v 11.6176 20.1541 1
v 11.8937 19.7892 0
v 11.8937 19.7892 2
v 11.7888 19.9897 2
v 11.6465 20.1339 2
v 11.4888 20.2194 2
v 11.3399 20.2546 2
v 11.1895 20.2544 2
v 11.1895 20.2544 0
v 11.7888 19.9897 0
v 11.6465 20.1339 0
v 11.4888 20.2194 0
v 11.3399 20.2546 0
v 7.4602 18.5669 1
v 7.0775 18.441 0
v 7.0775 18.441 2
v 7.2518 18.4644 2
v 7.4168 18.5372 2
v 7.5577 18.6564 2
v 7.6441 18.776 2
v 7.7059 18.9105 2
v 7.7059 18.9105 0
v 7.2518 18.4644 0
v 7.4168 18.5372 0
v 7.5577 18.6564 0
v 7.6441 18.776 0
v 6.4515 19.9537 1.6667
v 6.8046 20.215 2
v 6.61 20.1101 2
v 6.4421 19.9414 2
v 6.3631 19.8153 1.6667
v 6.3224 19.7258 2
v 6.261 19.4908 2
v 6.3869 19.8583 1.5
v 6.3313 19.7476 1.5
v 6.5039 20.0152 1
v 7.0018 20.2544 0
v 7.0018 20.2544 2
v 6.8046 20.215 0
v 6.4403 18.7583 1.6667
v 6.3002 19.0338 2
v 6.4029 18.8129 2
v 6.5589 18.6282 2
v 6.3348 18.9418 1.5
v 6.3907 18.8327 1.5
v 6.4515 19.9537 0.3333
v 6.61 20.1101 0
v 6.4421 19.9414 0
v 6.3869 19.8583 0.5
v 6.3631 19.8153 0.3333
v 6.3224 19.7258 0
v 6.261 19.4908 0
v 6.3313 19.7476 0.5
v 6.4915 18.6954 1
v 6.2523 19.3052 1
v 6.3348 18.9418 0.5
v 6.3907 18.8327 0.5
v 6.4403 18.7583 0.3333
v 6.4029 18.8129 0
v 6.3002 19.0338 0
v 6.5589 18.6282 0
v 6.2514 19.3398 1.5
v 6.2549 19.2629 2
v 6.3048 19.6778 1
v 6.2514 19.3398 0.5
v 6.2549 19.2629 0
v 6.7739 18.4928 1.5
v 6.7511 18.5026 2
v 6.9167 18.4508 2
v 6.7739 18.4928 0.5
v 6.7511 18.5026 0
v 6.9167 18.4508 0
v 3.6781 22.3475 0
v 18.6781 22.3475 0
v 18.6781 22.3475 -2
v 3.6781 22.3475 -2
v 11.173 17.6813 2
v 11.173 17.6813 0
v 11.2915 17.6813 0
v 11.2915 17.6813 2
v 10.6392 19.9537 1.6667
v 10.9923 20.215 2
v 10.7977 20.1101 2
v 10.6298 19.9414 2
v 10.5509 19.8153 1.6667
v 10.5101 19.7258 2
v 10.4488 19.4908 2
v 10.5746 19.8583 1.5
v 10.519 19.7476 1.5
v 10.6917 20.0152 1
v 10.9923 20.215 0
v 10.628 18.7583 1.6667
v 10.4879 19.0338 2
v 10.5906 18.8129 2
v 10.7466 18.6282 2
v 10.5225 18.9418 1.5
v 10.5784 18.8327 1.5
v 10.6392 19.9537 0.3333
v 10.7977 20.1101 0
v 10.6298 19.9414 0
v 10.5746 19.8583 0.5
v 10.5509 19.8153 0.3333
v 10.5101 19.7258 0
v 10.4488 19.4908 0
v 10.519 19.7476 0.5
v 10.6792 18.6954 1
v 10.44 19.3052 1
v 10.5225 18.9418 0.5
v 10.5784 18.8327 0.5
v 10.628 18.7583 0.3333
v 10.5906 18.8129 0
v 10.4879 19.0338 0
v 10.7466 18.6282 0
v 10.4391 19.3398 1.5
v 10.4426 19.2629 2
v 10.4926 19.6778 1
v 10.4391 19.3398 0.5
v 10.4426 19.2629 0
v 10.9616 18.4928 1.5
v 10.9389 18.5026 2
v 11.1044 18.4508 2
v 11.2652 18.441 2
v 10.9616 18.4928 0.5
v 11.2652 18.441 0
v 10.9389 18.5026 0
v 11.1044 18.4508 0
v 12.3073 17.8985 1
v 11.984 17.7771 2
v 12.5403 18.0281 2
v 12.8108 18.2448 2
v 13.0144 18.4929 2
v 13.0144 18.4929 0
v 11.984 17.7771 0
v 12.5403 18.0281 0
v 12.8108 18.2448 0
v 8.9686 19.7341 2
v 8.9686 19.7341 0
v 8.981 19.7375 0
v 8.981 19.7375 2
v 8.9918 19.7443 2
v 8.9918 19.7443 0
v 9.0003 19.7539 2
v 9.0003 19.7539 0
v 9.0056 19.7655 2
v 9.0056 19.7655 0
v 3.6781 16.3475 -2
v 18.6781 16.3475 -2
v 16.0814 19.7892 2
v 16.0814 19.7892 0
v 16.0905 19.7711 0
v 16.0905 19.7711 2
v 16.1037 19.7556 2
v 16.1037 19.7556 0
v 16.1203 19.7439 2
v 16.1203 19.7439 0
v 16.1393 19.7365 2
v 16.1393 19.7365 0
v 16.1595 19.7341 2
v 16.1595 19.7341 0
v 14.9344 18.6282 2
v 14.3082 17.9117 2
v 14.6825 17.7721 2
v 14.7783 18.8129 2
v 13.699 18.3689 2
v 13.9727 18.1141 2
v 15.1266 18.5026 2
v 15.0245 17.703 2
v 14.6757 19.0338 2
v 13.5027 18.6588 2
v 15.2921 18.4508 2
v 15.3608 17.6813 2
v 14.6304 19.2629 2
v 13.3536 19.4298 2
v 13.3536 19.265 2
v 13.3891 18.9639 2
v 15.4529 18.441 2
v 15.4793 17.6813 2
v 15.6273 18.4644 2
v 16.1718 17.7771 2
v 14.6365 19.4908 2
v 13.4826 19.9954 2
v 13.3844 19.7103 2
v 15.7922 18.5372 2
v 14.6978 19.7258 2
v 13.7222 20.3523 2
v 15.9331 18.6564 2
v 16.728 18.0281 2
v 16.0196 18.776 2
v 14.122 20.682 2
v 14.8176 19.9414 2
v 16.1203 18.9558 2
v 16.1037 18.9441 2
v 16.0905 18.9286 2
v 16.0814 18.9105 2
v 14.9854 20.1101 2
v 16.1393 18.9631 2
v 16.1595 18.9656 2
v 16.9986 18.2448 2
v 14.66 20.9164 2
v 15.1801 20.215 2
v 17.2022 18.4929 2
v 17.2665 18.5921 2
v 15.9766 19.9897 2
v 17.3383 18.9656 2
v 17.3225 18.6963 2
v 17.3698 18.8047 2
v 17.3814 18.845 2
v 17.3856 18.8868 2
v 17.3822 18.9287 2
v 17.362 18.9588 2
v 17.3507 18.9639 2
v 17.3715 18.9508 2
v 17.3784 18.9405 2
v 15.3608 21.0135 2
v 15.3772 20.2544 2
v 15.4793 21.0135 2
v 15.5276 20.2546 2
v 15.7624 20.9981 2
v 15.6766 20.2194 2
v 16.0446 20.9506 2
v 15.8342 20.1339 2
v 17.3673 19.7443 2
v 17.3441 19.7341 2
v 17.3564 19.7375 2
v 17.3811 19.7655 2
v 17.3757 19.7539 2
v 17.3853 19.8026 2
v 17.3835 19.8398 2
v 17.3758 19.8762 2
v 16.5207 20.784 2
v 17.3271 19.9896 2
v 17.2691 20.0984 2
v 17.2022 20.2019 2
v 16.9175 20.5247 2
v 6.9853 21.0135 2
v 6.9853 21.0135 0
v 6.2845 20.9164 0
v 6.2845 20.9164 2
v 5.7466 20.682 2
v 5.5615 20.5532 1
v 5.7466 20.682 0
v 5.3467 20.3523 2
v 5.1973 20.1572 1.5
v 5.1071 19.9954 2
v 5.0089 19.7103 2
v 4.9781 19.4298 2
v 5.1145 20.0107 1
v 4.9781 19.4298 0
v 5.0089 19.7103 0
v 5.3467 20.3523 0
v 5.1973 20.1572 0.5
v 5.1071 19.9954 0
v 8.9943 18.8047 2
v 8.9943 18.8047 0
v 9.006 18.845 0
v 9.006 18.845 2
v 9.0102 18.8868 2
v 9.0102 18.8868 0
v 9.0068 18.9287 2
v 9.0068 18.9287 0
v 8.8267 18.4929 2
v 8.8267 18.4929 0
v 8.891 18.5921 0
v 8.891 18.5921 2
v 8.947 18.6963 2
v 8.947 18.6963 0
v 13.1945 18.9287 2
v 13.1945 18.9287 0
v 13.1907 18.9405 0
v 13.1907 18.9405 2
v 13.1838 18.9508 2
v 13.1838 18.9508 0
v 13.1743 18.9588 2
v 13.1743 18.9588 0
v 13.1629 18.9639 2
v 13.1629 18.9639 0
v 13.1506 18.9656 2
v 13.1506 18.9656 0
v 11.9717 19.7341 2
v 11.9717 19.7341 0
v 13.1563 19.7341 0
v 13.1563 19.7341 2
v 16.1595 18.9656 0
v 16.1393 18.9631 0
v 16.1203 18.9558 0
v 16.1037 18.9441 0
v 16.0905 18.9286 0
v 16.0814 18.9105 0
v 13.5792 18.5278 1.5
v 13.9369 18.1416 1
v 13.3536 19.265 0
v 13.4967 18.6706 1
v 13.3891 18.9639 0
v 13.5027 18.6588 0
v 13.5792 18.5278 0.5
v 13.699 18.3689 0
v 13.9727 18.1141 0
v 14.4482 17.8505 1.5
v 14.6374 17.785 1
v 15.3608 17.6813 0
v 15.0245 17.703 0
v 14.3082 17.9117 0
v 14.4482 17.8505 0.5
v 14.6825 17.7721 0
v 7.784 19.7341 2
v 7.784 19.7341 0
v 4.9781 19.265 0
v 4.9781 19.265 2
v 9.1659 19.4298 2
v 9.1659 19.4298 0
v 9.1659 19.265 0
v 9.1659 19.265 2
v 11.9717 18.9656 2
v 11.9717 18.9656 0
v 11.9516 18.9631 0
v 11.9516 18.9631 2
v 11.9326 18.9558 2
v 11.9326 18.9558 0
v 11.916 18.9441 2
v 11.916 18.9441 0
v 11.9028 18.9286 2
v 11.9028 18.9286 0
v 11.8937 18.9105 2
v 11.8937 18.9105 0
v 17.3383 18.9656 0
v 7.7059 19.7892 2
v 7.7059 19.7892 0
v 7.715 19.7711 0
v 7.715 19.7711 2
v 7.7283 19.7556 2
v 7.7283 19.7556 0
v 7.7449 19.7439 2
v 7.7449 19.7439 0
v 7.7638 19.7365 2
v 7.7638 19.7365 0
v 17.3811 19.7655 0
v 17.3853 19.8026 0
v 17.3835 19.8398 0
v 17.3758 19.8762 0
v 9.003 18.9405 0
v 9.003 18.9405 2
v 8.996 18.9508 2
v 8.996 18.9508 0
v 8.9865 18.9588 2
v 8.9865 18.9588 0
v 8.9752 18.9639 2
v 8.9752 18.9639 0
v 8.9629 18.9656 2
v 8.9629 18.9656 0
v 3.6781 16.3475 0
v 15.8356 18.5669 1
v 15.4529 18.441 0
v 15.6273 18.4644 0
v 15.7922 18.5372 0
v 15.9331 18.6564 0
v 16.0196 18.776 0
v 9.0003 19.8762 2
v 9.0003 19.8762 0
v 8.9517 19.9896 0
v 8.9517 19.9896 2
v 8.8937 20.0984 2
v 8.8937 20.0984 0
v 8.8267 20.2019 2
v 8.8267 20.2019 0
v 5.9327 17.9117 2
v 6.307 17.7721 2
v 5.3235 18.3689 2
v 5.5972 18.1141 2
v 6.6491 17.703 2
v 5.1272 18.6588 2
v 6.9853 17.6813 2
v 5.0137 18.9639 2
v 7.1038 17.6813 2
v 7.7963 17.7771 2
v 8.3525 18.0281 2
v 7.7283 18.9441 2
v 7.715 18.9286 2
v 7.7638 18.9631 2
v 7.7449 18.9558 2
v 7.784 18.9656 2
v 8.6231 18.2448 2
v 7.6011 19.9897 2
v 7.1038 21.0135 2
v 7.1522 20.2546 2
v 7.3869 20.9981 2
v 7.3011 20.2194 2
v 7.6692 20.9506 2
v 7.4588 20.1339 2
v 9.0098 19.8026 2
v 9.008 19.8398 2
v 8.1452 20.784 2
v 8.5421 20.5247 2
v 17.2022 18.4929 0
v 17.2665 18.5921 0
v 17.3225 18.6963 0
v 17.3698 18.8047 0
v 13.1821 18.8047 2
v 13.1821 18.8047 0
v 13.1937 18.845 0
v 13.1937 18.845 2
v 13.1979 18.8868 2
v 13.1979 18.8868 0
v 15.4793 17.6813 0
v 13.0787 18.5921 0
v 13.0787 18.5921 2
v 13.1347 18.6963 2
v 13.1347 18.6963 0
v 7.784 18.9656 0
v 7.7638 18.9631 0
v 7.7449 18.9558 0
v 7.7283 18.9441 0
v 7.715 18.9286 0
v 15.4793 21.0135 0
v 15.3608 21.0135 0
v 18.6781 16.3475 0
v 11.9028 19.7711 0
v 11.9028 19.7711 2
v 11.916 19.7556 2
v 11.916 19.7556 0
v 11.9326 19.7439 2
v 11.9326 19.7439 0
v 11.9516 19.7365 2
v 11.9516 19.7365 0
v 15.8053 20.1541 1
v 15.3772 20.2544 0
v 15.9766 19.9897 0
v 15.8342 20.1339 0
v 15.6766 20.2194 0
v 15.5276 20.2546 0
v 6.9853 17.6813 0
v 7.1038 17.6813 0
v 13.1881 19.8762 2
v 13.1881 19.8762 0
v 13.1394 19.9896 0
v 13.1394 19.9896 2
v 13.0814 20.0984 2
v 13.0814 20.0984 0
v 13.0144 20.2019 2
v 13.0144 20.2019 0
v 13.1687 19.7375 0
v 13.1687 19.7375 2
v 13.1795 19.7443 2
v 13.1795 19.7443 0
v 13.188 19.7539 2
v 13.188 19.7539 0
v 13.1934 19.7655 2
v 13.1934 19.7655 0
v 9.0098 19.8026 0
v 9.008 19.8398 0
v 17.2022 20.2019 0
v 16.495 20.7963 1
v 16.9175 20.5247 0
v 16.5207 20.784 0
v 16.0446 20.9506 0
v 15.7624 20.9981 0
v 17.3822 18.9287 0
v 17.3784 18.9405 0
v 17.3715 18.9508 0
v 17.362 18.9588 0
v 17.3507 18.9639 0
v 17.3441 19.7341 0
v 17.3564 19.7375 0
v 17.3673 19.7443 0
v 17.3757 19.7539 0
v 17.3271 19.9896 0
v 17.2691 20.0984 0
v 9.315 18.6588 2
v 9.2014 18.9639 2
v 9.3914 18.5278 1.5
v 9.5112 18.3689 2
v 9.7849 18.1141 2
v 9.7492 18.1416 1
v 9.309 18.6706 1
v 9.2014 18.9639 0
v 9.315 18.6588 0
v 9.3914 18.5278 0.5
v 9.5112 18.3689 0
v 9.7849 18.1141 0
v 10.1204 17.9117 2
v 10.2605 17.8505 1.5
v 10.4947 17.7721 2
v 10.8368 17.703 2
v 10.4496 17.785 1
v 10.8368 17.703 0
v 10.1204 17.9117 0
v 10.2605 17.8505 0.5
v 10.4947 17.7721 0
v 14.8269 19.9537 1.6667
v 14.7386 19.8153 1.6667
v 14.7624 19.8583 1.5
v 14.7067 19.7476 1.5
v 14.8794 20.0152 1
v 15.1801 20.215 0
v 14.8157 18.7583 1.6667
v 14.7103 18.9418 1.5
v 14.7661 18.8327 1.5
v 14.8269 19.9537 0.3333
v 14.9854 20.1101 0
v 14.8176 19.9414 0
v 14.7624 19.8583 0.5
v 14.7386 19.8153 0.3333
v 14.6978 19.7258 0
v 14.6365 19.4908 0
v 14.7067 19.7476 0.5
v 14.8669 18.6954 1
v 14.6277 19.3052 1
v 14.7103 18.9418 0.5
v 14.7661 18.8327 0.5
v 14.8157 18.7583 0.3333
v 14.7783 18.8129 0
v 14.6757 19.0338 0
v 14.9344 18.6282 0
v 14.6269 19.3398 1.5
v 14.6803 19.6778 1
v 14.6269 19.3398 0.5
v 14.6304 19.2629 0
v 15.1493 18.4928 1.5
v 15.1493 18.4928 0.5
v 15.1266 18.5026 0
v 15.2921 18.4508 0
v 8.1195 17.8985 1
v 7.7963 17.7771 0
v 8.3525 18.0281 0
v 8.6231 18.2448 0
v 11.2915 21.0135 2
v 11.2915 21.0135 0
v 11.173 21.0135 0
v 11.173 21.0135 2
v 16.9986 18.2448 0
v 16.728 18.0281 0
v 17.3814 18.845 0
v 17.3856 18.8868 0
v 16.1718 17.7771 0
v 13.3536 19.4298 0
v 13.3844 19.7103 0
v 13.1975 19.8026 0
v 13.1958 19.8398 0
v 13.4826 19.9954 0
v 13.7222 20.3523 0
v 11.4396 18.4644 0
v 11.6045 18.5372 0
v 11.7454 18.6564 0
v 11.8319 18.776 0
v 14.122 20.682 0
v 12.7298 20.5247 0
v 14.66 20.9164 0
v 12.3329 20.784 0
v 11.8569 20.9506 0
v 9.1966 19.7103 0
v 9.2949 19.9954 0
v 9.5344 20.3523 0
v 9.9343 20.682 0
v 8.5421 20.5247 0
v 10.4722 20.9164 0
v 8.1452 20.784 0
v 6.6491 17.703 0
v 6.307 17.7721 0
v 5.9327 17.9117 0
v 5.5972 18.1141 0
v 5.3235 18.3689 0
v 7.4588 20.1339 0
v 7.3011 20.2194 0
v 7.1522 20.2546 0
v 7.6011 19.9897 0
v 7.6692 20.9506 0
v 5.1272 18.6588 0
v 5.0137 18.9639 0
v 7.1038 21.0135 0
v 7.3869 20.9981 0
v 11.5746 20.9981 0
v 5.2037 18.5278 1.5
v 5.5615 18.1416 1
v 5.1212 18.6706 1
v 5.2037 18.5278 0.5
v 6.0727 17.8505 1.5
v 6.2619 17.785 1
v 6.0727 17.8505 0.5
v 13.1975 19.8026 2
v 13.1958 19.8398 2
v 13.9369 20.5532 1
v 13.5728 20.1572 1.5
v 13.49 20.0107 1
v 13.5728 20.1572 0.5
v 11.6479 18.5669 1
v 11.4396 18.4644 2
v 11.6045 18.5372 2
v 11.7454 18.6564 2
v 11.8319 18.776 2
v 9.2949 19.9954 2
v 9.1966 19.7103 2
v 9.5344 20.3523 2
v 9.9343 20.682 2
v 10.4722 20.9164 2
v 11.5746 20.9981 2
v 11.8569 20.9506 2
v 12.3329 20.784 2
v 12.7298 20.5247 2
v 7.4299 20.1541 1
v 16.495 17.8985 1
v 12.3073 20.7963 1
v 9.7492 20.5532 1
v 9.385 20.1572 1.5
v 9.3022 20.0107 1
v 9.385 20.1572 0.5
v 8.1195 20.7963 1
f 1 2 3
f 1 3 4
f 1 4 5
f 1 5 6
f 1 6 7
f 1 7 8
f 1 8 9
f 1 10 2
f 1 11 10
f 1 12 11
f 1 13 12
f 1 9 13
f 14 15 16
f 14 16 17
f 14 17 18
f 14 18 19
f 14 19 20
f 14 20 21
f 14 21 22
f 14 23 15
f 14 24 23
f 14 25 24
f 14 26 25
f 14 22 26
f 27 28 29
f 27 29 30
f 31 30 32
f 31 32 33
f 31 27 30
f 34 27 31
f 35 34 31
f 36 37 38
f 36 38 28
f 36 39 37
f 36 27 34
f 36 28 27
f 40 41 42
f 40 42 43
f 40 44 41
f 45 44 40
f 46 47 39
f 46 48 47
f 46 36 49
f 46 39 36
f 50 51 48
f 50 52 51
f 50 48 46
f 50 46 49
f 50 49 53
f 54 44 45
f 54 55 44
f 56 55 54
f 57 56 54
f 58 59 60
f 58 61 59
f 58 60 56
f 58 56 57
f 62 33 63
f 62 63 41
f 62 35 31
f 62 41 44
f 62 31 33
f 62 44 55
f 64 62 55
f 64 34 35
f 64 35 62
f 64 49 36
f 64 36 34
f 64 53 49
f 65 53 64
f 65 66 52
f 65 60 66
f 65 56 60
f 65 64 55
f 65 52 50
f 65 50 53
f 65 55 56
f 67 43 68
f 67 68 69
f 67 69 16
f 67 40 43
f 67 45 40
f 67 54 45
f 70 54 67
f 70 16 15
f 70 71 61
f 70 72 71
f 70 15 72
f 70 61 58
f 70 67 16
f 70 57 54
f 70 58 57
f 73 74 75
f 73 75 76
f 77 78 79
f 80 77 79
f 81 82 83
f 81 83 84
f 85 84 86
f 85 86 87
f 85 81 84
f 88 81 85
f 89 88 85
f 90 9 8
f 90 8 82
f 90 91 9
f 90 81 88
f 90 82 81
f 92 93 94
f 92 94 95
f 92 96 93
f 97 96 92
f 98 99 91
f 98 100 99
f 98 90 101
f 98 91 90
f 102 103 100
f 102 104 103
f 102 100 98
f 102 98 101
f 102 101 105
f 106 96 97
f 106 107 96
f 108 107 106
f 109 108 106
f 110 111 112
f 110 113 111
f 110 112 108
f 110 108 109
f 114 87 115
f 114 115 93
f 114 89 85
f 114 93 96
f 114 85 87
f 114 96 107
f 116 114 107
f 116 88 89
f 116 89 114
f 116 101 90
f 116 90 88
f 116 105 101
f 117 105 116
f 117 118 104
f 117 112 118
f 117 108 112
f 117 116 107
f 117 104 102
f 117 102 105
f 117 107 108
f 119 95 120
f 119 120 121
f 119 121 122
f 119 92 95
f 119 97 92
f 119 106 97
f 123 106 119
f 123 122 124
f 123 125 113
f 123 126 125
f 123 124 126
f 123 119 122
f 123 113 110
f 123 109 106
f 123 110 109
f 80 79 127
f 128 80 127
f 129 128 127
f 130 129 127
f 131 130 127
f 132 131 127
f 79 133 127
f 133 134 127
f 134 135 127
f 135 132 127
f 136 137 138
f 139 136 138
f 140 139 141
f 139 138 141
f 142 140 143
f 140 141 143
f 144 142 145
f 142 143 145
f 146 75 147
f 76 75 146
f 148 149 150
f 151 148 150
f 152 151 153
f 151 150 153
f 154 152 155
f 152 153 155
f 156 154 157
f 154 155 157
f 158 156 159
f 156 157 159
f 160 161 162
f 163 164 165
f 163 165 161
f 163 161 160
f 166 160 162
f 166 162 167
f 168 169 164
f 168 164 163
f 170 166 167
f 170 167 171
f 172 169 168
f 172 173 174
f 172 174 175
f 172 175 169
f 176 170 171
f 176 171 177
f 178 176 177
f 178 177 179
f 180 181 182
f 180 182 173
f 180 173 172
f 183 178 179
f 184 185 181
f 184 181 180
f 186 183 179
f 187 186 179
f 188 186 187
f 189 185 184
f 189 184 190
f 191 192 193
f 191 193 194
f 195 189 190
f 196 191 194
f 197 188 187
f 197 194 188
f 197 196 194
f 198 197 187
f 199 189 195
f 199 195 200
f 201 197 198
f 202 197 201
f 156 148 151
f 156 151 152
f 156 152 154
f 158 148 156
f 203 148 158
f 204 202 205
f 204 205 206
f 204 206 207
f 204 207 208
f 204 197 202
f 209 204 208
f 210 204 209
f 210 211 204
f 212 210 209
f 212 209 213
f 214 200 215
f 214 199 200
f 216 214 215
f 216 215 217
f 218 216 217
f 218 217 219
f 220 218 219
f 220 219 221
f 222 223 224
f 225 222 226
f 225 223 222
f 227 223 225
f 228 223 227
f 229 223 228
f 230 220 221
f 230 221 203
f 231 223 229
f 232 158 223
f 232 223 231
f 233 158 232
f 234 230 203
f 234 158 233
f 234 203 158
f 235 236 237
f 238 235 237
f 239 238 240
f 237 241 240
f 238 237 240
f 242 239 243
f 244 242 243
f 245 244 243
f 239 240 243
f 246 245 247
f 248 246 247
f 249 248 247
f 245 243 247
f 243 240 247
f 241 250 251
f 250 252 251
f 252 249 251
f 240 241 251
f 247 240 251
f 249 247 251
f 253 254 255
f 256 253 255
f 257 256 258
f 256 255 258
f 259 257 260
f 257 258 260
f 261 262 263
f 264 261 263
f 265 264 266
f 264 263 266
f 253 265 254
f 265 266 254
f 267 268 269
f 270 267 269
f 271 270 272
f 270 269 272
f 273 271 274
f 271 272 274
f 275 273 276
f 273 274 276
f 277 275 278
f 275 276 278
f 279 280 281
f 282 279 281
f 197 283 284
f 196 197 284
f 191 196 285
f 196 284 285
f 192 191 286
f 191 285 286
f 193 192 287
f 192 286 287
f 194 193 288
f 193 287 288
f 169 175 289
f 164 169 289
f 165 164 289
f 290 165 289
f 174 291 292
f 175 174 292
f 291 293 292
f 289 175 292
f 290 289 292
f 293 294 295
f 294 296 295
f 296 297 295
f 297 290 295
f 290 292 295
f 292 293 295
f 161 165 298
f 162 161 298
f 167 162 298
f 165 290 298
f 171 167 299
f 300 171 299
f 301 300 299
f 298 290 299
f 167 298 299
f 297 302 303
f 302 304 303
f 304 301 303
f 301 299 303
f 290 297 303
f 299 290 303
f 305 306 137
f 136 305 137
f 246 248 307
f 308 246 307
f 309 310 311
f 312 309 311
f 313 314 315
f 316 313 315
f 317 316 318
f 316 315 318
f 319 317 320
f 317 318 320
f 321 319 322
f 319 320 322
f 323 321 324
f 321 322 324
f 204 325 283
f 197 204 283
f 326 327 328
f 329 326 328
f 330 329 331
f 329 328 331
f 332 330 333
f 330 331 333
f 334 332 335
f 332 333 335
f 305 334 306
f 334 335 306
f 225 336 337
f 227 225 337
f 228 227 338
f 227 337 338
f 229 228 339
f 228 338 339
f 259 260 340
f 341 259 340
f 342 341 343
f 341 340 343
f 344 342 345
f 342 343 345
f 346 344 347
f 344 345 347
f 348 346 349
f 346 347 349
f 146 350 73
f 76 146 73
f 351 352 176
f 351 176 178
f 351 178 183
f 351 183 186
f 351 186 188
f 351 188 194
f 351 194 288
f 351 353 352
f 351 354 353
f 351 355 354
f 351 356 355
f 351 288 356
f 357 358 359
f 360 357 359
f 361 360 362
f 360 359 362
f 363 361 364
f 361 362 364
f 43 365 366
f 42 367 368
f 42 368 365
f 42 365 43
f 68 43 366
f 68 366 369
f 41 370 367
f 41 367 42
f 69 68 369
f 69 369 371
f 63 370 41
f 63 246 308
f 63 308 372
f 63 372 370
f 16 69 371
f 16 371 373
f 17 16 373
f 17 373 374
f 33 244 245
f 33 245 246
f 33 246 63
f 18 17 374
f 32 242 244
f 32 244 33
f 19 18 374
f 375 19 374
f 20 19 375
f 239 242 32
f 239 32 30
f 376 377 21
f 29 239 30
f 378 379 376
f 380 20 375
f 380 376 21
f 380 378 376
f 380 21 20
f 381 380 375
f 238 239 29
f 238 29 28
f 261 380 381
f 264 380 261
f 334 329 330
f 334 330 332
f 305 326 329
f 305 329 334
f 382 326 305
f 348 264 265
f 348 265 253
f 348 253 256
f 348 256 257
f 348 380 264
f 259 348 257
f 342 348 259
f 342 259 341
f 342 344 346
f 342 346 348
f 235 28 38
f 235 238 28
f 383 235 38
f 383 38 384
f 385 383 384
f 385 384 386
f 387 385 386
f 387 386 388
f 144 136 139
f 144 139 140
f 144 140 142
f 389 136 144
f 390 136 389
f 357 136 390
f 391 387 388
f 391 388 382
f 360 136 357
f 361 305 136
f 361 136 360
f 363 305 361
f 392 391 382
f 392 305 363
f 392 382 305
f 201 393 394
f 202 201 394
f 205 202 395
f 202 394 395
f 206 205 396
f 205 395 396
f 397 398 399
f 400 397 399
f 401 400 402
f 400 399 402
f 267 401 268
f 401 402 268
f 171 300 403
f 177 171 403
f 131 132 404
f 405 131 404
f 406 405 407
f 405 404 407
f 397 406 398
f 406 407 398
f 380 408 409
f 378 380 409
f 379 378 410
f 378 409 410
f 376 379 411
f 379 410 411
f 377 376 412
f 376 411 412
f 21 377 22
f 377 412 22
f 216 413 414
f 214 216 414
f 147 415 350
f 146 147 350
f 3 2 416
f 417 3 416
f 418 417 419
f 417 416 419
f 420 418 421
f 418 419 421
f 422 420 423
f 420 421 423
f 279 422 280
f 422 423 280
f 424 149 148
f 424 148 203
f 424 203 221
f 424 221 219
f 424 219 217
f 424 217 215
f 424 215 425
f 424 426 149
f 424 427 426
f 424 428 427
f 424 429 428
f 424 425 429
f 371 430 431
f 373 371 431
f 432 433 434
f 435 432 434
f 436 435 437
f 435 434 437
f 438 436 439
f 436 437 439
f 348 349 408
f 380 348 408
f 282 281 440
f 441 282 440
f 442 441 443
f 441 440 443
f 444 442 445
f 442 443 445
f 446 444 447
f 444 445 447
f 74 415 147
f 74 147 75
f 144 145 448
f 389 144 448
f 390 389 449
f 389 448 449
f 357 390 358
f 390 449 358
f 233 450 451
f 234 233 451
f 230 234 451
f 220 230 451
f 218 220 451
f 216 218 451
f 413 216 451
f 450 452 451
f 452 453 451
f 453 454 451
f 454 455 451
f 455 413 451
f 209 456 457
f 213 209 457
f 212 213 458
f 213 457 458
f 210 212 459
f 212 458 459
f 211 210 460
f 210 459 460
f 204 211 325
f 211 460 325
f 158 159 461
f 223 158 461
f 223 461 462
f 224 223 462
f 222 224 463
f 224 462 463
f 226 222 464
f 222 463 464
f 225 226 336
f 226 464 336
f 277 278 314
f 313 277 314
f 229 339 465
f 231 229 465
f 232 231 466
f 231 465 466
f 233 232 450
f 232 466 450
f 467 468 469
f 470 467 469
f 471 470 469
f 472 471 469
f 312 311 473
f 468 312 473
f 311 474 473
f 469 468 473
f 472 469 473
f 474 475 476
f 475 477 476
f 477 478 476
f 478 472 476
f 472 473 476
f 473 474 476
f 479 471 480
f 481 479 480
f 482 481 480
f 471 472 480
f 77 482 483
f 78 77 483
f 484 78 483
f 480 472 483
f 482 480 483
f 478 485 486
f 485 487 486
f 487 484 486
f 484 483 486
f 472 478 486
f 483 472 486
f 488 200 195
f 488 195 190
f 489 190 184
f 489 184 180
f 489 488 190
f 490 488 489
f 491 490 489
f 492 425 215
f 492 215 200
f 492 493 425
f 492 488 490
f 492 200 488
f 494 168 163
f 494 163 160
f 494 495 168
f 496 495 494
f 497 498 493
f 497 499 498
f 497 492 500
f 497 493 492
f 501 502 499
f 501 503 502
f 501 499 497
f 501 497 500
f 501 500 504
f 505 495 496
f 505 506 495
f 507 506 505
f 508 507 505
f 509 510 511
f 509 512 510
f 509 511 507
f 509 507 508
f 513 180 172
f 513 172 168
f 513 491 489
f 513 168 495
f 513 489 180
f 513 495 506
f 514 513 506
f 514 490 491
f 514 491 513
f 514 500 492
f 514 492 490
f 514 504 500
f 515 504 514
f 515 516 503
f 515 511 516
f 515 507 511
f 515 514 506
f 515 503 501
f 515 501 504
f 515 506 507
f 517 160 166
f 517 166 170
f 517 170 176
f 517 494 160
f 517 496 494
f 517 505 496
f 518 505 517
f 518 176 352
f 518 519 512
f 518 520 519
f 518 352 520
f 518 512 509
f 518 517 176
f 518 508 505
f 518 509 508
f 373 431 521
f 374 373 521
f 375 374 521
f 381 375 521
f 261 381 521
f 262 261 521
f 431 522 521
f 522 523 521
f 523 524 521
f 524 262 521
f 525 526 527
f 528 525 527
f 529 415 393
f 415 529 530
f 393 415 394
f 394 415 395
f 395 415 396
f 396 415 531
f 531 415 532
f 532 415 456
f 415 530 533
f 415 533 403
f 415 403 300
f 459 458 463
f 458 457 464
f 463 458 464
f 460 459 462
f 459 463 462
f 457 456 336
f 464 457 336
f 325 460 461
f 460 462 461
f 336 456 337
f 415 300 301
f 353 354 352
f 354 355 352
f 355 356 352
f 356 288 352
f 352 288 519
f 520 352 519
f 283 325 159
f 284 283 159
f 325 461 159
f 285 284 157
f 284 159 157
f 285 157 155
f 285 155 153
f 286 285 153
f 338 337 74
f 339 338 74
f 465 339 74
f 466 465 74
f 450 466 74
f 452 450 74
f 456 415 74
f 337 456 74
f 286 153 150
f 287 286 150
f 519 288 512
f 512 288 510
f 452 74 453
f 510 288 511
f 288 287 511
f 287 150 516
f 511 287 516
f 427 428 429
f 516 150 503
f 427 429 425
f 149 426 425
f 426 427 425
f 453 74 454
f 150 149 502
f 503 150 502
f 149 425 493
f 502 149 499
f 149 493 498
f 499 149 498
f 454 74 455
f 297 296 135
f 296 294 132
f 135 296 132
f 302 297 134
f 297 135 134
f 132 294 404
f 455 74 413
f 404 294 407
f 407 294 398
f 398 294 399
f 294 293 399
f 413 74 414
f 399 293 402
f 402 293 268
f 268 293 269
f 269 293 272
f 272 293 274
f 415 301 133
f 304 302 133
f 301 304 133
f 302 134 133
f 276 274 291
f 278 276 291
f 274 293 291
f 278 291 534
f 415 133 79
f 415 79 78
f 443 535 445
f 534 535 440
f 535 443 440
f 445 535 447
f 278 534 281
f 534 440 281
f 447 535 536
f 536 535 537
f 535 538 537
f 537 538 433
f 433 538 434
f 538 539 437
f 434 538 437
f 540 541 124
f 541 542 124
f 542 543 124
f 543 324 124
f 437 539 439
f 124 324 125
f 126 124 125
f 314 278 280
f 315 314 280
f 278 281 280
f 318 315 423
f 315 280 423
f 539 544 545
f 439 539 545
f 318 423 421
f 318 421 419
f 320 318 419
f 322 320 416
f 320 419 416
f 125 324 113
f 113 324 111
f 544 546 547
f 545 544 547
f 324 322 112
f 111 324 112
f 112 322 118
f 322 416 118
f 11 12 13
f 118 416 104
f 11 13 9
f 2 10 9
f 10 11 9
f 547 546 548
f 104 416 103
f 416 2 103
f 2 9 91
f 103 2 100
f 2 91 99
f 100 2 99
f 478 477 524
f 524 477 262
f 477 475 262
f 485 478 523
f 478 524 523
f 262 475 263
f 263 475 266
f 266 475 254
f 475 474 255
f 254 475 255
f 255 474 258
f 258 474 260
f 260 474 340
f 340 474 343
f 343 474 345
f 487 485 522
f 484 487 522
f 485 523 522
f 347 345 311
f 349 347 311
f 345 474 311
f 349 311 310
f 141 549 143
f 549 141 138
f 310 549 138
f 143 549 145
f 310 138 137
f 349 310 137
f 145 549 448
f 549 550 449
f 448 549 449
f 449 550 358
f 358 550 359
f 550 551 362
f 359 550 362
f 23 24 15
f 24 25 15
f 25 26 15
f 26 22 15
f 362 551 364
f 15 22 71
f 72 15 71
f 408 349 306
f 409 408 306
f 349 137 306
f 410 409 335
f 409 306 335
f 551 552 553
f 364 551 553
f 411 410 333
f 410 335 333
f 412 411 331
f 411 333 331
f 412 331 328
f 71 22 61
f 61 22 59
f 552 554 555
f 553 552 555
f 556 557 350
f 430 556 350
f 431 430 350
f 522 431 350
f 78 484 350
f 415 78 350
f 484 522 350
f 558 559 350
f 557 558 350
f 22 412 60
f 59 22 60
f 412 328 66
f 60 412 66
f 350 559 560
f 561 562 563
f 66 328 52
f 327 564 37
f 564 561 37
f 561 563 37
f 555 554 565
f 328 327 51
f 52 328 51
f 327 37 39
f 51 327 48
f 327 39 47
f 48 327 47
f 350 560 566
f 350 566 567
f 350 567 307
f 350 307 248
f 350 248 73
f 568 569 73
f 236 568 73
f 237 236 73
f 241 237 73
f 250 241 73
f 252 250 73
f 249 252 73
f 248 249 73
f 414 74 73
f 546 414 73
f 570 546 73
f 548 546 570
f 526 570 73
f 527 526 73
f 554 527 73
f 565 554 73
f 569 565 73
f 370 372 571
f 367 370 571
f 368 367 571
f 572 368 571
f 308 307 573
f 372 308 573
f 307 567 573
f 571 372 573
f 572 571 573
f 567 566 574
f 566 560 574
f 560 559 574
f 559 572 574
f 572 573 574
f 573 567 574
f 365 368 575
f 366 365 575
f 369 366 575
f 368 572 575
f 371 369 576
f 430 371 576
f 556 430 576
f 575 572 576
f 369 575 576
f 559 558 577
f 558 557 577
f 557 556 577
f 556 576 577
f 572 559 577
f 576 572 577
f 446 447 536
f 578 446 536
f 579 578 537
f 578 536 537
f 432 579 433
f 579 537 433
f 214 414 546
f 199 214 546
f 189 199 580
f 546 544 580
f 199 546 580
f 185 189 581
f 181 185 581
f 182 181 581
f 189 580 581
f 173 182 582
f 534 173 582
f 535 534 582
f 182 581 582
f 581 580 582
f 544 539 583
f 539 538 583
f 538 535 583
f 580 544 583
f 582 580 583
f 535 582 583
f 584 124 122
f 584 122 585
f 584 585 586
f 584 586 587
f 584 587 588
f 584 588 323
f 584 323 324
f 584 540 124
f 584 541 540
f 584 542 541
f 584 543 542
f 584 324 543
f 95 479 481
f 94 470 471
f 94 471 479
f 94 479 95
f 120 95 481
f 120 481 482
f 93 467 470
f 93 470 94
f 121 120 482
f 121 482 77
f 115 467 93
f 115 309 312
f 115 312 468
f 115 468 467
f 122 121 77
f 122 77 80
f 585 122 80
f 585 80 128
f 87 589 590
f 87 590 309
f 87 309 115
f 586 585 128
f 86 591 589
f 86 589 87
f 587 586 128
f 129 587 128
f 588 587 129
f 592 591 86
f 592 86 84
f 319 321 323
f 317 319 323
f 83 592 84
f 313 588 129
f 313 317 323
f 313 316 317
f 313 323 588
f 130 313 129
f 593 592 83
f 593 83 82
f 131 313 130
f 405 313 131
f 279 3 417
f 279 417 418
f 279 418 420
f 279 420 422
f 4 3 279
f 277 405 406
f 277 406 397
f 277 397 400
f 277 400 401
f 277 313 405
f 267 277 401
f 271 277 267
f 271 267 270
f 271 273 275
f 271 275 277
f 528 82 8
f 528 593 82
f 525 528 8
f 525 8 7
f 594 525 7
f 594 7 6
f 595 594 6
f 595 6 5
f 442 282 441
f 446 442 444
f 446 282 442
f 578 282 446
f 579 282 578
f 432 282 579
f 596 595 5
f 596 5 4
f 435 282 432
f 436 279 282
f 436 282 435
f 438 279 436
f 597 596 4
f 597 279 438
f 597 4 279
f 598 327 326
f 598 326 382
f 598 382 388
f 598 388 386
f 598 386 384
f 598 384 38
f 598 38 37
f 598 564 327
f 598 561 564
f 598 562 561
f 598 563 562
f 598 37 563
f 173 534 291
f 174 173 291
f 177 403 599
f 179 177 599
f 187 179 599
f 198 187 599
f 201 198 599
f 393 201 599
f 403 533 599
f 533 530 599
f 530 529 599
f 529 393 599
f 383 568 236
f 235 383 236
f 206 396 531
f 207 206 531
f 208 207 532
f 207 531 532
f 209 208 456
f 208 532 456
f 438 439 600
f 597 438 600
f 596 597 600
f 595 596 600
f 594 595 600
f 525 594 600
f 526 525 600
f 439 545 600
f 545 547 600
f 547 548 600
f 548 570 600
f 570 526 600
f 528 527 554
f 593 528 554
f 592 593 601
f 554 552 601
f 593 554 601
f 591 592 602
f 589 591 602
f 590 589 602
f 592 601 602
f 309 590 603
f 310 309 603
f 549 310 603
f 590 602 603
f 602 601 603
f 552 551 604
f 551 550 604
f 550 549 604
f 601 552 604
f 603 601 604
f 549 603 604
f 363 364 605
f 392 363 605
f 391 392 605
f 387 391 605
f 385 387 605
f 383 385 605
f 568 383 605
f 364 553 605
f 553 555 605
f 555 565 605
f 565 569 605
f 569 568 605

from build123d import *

# Parameters (mm, degrees)
BOSS_EXTRUDE1_DEPTH   = 2
BOSS_EXTRUDE1_2_DEPTH = 2
BOSS_EXTRUDE1_3_DEPTH = 2
SKETCH3_W             = 15
SKETCH3_H             = 6
BOSS_EXTRUDE2_DEPTH   = 2


with BuildPart() as part:
    # Sketch2 → Boss-Extrude1 (new body)
    with BuildSketch(Plane.XY):
        with BuildLine():
            Line((11.971746688, 19.734053644), (13.156348071, 19.734053669))
            ThreePointArc((13.156348071, 19.734053669), (13.179525443, 19.744291413), (13.193365664, 19.765515226))
            ThreePointArc((13.193365664, 19.765515226), (13.19739915, 19.821201025), (13.188063691, 19.8762467))
            ThreePointArc((13.188063691, 19.8762467), (13.111547426, 20.044582448), (13.014440765, 20.20194178))
            add(Edge.make_bspline(
                [(13.014440765, 20.20194178), (12.484950193, 21.013504257), (11.291530639, 21.013504258)],
                knots=[0.342748392, 0.342748392, 0.342748392, 1.381331673, 1.381331673, 1.381331673], degree=2, weights=[1, 0.868170932, 1]))
            Line((11.291530639, 21.013504258), (11.173022933, 21.013504277))
            add(Edge.make_bspline(
                [(11.173022933, 21.013504277), (9.165862366, 21.013504277), (9.16586234, 19.429763689)],
                knots=[4.81203319, 4.81203319, 4.81203319, 6.344970319, 6.344970319, 6.344970319], degree=2, weights=[1, 0.720364545, 1]))
            Line((9.16586234, 19.429763689), (9.165862348, 19.265041834))
            add(Edge.make_bspline(
                [(9.165862348, 19.265041834), (9.165862348, 17.681301204), (11.173022971, 17.681301277)],
                knots=[3.079807634, 3.079807634, 3.079807634, 4.612744788, 4.612744788, 4.612744788], degree=2, weights=[1, 0.720364536, 1]))
            Line((11.173022971, 17.681301277), (11.291530595, 17.681301231))
            add(Edge.make_bspline(
                [(11.291530595, 17.681301231), (12.48495018, 17.681301231), (13.014440765, 18.492863728)],
                knots=[1.760260959, 1.760260959, 1.760260959, 2.798844261, 2.798844261, 2.798844261], degree=2, weights=[1, 0.868170926, 1]))
            ThreePointArc((13.014440765, 18.492863728), (13.107795315, 18.64362681), (13.182053506, 18.804655688))
            ThreePointArc((13.182053506, 18.804655688), (13.196728173, 18.865824439), (13.194497656, 18.928689268))
            ThreePointArc((13.194497656, 18.928689268), (13.179302023, 18.955174053), (13.150618481, 18.965643321))
            Line((13.150618481, 18.965643321), (11.971746647, 18.965643321))
            ThreePointArc((11.971746647, 18.965643321), (11.923939268, 18.950452436), (11.893668965, 18.91045222))
            add(Edge.make_bspline(
                [(11.265198612, 18.440979368), (11.727360525, 18.440524679), (11.893668965, 18.91045222)],
                knots=[5.955155363, 5.955155363, 5.955155363, 7.020735544, 7.020735544, 7.020735544], degree=2, weights=[1, 0.86139323, 1]))
            add(Edge.make_bspline(
                [(11.189511072, 20.254442875), (10.402055714, 20.214623084), (10.44001251, 19.305183226), (10.477969307, 18.395743368), (11.265198612, 18.440979368)],
                knots=[3.181025595, 3.181025595, 3.181025595, 4.754799698, 4.754799698, 6.328573801, 6.328573801, 6.328573801], degree=2, weights=[1, 0.706053195, 1, 0.706053195, 1]))
            add(Edge.make_bspline(
                [(11.893668965, 19.789244771), (11.708556533, 20.312305593), (11.189511072, 20.254442875)],
                knots=[2.404042417, 2.404042417, 2.404042417, 3.565685694, 3.565685694, 3.565685694], degree=2, weights=[1, 0.83601209, 1]))
            ThreePointArc((11.893668965, 19.789244771), (11.923939288, 19.749244541), (11.971746688, 19.734053644))
        make_face()
    extrude(amount=BOSS_EXTRUDE1_DEPTH)



with BuildPart() as body_2:
    # Sketch2 → Boss-Extrude1 2 (new body)
    with BuildSketch(Plane.XY):
        with BuildLine():
            Line((7.784019348, 19.734053644), (8.968620799, 19.734053669))
            ThreePointArc((8.968620799, 19.734053669), (8.99179817, 19.744291413), (9.005638392, 19.765515226))
            ThreePointArc((9.005638392, 19.765515226), (9.009671877, 19.821201025), (9.000336418, 19.8762467))
            ThreePointArc((9.000336418, 19.8762467), (8.923820153, 20.044582448), (8.826713493, 20.20194178))
            add(Edge.make_bspline(
                [(8.826713493, 20.20194178), (8.29722292, 21.013504257), (7.103803365, 21.013504258)],
                knots=[0.342748392, 0.342748392, 0.342748392, 1.381331673, 1.381331673, 1.381331673], degree=2, weights=[1, 0.868170932, 1]))
            Line((7.103803365, 21.013504258), (6.98529566, 21.013504277))
            add(Edge.make_bspline(
                [(6.98529566, 21.013504277), (4.978135095, 21.013504277), (4.978135132, 19.429763689)],
                knots=[4.81203319, 4.81203319, 4.81203319, 6.344970317, 6.344970317, 6.344970317], degree=2, weights=[1, 0.720364545, 1]))
            Line((4.978135132, 19.429763689), (4.978135076, 19.265041834))
            add(Edge.make_bspline(
                [(4.978135076, 19.265041834), (4.978135076, 17.681301205), (6.985295697, 17.681301277)],
                knots=[3.079807634, 3.079807634, 3.079807634, 4.612744788, 4.612744788, 4.612744788], degree=2, weights=[1, 0.720364536, 1]))
            Line((6.985295697, 17.681301277), (7.103803322, 17.681301231))
            add(Edge.make_bspline(
                [(7.103803322, 17.681301231), (8.297222907, 17.681301231), (8.826713493, 18.492863728)],
                knots=[4.901853612, 4.901853612, 4.901853612, 5.940436915, 5.940436915, 5.940436915], degree=2, weights=[1, 0.868170926, 1]))
            ThreePointArc((8.826713493, 18.492863728), (8.920068042, 18.64362681), (8.994326233, 18.804655688))
            ThreePointArc((8.994326233, 18.804655688), (9.009000901, 18.865824439), (9.006770384, 18.928689268))
            ThreePointArc((9.006770384, 18.928689268), (8.99157475, 18.955174054), (8.962891207, 18.965643321))
            Line((8.962891207, 18.965643321), (7.784019375, 18.965643321))
            ThreePointArc((7.784019375, 18.965643321), (7.736211995, 18.950452436), (7.705941692, 18.91045222))
            add(Edge.make_bspline(
                [(7.07747134, 18.440979368), (7.539633252, 18.440524679), (7.705941692, 18.91045222)],
                knots=[5.955155363, 5.955155363, 5.955155363, 7.020735544, 7.020735544, 7.020735544], degree=2, weights=[1, 0.86139323, 1]))
            add(Edge.make_bspline(
                [(7.0017838, 20.254442875), (6.214328441, 20.214623084), (6.252285238, 19.305183226), (6.290242034, 18.395743368), (7.07747134, 18.440979368)],
                knots=[3.181025595, 3.181025595, 3.181025595, 4.754799698, 4.754799698, 6.328573801, 6.328573801, 6.328573801], degree=2, weights=[1, 0.706053195, 1, 0.706053195, 1]))
            add(Edge.make_bspline(
                [(7.705941692, 19.78924477), (7.520829261, 20.312305593), (7.0017838, 20.254442875)],
                knots=[2.404042417, 2.404042417, 2.404042417, 3.565685694, 3.565685694, 3.565685694], degree=2, weights=[1, 0.83601209, 1]))
            ThreePointArc((7.705941692, 19.78924477), (7.736211988, 19.74924456), (7.784019348, 19.734053644))
        make_face()
    extrude(amount=BOSS_EXTRUDE1_2_DEPTH)


with BuildPart() as body_3:
    # Sketch2 → Boss-Extrude1 3 (new body)
    with BuildSketch(Plane.XY):
        with BuildLine():
            Line((16.159473961, 19.734053644), (17.344075345, 19.734053669))
            ThreePointArc((17.344075345, 19.734053669), (17.367252716, 19.744291413), (17.381092938, 19.765515226))
            ThreePointArc((17.381092938, 19.765515226), (17.385126423, 19.821201025), (17.375790964, 19.8762467))
            ThreePointArc((17.375790964, 19.8762467), (17.2992747, 20.044582448), (17.202168039, 20.20194178))
            add(Edge.make_bspline(
                [(17.202168039, 20.20194178), (16.672677467, 21.013504257), (15.479257913, 21.013504258)],
                knots=[0.342748392, 0.342748392, 0.342748392, 1.381331673, 1.381331673, 1.381331673], degree=2, weights=[1, 0.868170932, 1]))
            Line((15.479257913, 21.013504258), (15.360750206, 21.013504277))
            add(Edge.make_bspline(
                [(15.360750206, 21.013504277), (13.353589639, 21.013504277), (13.353589613, 19.429763689)],
                knots=[4.81203319, 4.81203319, 4.81203319, 6.344970319, 6.344970319, 6.344970319], degree=2, weights=[1, 0.720364545, 1]))
            Line((13.353589613, 19.429763689), (13.353589622, 19.265041834))
            add(Edge.make_bspline(
                [(13.353589622, 19.265041834), (13.353589622, 17.681301204), (15.360750245, 17.681301277)],
                knots=[3.079807634, 3.079807634, 3.079807634, 4.612744788, 4.612744788, 4.612744788], degree=2, weights=[1, 0.720364536, 1]))
            Line((15.360750245, 17.681301277), (15.479257869, 17.681301231))
            add(Edge.make_bspline(
                [(15.479257869, 17.681301231), (16.672677453, 17.681301231), (17.202168039, 18.492863728)],
                knots=[1.760260959, 1.760260959, 1.760260959, 2.798844261, 2.798844261, 2.798844261], degree=2, weights=[1, 0.868170926, 1]))
            ThreePointArc((17.202168039, 18.492863728), (17.295522588, 18.64362681), (17.369780779, 18.804655688))
            ThreePointArc((17.369780779, 18.804655688), (17.384455447, 18.865824439), (17.38222493, 18.928689268))
            ThreePointArc((17.38222493, 18.928689268), (17.367029296, 18.955174053), (17.338345755, 18.965643321))
            Line((17.338345755, 18.965643321), (16.159473921, 18.965643321))
            ThreePointArc((16.159473921, 18.965643321), (16.111666541, 18.950452436), (16.081396238, 18.91045222))
            add(Edge.make_bspline(
                [(15.452925886, 18.440979368), (15.915087798, 18.440524679), (16.081396238, 18.91045222)],
                knots=[5.955155363, 5.955155363, 5.955155363, 7.020735544, 7.020735544, 7.020735544], degree=2, weights=[1, 0.86139323, 1]))
            add(Edge.make_bspline(
                [(15.377238346, 20.254442875), (14.589782987, 20.214623084), (14.627739784, 19.305183226), (14.665696581, 18.395743368), (15.452925886, 18.440979368)],
                knots=[3.181025595, 3.181025595, 3.181025595, 4.754799698, 4.754799698, 6.328573801, 6.328573801, 6.328573801], degree=2, weights=[1, 0.706053195, 1, 0.706053195, 1]))
            add(Edge.make_bspline(
                [(16.081396238, 19.789244771), (15.896283807, 20.312305593), (15.377238346, 20.254442875)],
                knots=[2.404042417, 2.404042417, 2.404042417, 3.565685694, 3.565685694, 3.565685694], degree=2, weights=[1, 0.83601209, 1]))
            ThreePointArc((16.081396238, 19.789244771), (16.111666561, 19.749244541), (16.159473961, 19.734053644))
        make_face()
    extrude(amount=BOSS_EXTRUDE1_3_DEPTH)


with BuildPart() as part_1:
    add(part.part)

    add(body_2.part)  # Boss-Extrude2 merges body 2

    add(body_3.part)  # Boss-Extrude2 merges body 3
    # Sketch3 → Boss-Extrude2 (add)
    with BuildSketch(Plane(origin=(0, 0, 0), x_dir=(-1, 0, 0), z_dir=(0, 0, -1))):
        with Locations((-11.178135076, 19.347504277)):
            Rectangle(SKETCH3_W, SKETCH3_H)
    extrude(amount=BOSS_EXTRUDE2_DEPTH)


solid = part_1.part
